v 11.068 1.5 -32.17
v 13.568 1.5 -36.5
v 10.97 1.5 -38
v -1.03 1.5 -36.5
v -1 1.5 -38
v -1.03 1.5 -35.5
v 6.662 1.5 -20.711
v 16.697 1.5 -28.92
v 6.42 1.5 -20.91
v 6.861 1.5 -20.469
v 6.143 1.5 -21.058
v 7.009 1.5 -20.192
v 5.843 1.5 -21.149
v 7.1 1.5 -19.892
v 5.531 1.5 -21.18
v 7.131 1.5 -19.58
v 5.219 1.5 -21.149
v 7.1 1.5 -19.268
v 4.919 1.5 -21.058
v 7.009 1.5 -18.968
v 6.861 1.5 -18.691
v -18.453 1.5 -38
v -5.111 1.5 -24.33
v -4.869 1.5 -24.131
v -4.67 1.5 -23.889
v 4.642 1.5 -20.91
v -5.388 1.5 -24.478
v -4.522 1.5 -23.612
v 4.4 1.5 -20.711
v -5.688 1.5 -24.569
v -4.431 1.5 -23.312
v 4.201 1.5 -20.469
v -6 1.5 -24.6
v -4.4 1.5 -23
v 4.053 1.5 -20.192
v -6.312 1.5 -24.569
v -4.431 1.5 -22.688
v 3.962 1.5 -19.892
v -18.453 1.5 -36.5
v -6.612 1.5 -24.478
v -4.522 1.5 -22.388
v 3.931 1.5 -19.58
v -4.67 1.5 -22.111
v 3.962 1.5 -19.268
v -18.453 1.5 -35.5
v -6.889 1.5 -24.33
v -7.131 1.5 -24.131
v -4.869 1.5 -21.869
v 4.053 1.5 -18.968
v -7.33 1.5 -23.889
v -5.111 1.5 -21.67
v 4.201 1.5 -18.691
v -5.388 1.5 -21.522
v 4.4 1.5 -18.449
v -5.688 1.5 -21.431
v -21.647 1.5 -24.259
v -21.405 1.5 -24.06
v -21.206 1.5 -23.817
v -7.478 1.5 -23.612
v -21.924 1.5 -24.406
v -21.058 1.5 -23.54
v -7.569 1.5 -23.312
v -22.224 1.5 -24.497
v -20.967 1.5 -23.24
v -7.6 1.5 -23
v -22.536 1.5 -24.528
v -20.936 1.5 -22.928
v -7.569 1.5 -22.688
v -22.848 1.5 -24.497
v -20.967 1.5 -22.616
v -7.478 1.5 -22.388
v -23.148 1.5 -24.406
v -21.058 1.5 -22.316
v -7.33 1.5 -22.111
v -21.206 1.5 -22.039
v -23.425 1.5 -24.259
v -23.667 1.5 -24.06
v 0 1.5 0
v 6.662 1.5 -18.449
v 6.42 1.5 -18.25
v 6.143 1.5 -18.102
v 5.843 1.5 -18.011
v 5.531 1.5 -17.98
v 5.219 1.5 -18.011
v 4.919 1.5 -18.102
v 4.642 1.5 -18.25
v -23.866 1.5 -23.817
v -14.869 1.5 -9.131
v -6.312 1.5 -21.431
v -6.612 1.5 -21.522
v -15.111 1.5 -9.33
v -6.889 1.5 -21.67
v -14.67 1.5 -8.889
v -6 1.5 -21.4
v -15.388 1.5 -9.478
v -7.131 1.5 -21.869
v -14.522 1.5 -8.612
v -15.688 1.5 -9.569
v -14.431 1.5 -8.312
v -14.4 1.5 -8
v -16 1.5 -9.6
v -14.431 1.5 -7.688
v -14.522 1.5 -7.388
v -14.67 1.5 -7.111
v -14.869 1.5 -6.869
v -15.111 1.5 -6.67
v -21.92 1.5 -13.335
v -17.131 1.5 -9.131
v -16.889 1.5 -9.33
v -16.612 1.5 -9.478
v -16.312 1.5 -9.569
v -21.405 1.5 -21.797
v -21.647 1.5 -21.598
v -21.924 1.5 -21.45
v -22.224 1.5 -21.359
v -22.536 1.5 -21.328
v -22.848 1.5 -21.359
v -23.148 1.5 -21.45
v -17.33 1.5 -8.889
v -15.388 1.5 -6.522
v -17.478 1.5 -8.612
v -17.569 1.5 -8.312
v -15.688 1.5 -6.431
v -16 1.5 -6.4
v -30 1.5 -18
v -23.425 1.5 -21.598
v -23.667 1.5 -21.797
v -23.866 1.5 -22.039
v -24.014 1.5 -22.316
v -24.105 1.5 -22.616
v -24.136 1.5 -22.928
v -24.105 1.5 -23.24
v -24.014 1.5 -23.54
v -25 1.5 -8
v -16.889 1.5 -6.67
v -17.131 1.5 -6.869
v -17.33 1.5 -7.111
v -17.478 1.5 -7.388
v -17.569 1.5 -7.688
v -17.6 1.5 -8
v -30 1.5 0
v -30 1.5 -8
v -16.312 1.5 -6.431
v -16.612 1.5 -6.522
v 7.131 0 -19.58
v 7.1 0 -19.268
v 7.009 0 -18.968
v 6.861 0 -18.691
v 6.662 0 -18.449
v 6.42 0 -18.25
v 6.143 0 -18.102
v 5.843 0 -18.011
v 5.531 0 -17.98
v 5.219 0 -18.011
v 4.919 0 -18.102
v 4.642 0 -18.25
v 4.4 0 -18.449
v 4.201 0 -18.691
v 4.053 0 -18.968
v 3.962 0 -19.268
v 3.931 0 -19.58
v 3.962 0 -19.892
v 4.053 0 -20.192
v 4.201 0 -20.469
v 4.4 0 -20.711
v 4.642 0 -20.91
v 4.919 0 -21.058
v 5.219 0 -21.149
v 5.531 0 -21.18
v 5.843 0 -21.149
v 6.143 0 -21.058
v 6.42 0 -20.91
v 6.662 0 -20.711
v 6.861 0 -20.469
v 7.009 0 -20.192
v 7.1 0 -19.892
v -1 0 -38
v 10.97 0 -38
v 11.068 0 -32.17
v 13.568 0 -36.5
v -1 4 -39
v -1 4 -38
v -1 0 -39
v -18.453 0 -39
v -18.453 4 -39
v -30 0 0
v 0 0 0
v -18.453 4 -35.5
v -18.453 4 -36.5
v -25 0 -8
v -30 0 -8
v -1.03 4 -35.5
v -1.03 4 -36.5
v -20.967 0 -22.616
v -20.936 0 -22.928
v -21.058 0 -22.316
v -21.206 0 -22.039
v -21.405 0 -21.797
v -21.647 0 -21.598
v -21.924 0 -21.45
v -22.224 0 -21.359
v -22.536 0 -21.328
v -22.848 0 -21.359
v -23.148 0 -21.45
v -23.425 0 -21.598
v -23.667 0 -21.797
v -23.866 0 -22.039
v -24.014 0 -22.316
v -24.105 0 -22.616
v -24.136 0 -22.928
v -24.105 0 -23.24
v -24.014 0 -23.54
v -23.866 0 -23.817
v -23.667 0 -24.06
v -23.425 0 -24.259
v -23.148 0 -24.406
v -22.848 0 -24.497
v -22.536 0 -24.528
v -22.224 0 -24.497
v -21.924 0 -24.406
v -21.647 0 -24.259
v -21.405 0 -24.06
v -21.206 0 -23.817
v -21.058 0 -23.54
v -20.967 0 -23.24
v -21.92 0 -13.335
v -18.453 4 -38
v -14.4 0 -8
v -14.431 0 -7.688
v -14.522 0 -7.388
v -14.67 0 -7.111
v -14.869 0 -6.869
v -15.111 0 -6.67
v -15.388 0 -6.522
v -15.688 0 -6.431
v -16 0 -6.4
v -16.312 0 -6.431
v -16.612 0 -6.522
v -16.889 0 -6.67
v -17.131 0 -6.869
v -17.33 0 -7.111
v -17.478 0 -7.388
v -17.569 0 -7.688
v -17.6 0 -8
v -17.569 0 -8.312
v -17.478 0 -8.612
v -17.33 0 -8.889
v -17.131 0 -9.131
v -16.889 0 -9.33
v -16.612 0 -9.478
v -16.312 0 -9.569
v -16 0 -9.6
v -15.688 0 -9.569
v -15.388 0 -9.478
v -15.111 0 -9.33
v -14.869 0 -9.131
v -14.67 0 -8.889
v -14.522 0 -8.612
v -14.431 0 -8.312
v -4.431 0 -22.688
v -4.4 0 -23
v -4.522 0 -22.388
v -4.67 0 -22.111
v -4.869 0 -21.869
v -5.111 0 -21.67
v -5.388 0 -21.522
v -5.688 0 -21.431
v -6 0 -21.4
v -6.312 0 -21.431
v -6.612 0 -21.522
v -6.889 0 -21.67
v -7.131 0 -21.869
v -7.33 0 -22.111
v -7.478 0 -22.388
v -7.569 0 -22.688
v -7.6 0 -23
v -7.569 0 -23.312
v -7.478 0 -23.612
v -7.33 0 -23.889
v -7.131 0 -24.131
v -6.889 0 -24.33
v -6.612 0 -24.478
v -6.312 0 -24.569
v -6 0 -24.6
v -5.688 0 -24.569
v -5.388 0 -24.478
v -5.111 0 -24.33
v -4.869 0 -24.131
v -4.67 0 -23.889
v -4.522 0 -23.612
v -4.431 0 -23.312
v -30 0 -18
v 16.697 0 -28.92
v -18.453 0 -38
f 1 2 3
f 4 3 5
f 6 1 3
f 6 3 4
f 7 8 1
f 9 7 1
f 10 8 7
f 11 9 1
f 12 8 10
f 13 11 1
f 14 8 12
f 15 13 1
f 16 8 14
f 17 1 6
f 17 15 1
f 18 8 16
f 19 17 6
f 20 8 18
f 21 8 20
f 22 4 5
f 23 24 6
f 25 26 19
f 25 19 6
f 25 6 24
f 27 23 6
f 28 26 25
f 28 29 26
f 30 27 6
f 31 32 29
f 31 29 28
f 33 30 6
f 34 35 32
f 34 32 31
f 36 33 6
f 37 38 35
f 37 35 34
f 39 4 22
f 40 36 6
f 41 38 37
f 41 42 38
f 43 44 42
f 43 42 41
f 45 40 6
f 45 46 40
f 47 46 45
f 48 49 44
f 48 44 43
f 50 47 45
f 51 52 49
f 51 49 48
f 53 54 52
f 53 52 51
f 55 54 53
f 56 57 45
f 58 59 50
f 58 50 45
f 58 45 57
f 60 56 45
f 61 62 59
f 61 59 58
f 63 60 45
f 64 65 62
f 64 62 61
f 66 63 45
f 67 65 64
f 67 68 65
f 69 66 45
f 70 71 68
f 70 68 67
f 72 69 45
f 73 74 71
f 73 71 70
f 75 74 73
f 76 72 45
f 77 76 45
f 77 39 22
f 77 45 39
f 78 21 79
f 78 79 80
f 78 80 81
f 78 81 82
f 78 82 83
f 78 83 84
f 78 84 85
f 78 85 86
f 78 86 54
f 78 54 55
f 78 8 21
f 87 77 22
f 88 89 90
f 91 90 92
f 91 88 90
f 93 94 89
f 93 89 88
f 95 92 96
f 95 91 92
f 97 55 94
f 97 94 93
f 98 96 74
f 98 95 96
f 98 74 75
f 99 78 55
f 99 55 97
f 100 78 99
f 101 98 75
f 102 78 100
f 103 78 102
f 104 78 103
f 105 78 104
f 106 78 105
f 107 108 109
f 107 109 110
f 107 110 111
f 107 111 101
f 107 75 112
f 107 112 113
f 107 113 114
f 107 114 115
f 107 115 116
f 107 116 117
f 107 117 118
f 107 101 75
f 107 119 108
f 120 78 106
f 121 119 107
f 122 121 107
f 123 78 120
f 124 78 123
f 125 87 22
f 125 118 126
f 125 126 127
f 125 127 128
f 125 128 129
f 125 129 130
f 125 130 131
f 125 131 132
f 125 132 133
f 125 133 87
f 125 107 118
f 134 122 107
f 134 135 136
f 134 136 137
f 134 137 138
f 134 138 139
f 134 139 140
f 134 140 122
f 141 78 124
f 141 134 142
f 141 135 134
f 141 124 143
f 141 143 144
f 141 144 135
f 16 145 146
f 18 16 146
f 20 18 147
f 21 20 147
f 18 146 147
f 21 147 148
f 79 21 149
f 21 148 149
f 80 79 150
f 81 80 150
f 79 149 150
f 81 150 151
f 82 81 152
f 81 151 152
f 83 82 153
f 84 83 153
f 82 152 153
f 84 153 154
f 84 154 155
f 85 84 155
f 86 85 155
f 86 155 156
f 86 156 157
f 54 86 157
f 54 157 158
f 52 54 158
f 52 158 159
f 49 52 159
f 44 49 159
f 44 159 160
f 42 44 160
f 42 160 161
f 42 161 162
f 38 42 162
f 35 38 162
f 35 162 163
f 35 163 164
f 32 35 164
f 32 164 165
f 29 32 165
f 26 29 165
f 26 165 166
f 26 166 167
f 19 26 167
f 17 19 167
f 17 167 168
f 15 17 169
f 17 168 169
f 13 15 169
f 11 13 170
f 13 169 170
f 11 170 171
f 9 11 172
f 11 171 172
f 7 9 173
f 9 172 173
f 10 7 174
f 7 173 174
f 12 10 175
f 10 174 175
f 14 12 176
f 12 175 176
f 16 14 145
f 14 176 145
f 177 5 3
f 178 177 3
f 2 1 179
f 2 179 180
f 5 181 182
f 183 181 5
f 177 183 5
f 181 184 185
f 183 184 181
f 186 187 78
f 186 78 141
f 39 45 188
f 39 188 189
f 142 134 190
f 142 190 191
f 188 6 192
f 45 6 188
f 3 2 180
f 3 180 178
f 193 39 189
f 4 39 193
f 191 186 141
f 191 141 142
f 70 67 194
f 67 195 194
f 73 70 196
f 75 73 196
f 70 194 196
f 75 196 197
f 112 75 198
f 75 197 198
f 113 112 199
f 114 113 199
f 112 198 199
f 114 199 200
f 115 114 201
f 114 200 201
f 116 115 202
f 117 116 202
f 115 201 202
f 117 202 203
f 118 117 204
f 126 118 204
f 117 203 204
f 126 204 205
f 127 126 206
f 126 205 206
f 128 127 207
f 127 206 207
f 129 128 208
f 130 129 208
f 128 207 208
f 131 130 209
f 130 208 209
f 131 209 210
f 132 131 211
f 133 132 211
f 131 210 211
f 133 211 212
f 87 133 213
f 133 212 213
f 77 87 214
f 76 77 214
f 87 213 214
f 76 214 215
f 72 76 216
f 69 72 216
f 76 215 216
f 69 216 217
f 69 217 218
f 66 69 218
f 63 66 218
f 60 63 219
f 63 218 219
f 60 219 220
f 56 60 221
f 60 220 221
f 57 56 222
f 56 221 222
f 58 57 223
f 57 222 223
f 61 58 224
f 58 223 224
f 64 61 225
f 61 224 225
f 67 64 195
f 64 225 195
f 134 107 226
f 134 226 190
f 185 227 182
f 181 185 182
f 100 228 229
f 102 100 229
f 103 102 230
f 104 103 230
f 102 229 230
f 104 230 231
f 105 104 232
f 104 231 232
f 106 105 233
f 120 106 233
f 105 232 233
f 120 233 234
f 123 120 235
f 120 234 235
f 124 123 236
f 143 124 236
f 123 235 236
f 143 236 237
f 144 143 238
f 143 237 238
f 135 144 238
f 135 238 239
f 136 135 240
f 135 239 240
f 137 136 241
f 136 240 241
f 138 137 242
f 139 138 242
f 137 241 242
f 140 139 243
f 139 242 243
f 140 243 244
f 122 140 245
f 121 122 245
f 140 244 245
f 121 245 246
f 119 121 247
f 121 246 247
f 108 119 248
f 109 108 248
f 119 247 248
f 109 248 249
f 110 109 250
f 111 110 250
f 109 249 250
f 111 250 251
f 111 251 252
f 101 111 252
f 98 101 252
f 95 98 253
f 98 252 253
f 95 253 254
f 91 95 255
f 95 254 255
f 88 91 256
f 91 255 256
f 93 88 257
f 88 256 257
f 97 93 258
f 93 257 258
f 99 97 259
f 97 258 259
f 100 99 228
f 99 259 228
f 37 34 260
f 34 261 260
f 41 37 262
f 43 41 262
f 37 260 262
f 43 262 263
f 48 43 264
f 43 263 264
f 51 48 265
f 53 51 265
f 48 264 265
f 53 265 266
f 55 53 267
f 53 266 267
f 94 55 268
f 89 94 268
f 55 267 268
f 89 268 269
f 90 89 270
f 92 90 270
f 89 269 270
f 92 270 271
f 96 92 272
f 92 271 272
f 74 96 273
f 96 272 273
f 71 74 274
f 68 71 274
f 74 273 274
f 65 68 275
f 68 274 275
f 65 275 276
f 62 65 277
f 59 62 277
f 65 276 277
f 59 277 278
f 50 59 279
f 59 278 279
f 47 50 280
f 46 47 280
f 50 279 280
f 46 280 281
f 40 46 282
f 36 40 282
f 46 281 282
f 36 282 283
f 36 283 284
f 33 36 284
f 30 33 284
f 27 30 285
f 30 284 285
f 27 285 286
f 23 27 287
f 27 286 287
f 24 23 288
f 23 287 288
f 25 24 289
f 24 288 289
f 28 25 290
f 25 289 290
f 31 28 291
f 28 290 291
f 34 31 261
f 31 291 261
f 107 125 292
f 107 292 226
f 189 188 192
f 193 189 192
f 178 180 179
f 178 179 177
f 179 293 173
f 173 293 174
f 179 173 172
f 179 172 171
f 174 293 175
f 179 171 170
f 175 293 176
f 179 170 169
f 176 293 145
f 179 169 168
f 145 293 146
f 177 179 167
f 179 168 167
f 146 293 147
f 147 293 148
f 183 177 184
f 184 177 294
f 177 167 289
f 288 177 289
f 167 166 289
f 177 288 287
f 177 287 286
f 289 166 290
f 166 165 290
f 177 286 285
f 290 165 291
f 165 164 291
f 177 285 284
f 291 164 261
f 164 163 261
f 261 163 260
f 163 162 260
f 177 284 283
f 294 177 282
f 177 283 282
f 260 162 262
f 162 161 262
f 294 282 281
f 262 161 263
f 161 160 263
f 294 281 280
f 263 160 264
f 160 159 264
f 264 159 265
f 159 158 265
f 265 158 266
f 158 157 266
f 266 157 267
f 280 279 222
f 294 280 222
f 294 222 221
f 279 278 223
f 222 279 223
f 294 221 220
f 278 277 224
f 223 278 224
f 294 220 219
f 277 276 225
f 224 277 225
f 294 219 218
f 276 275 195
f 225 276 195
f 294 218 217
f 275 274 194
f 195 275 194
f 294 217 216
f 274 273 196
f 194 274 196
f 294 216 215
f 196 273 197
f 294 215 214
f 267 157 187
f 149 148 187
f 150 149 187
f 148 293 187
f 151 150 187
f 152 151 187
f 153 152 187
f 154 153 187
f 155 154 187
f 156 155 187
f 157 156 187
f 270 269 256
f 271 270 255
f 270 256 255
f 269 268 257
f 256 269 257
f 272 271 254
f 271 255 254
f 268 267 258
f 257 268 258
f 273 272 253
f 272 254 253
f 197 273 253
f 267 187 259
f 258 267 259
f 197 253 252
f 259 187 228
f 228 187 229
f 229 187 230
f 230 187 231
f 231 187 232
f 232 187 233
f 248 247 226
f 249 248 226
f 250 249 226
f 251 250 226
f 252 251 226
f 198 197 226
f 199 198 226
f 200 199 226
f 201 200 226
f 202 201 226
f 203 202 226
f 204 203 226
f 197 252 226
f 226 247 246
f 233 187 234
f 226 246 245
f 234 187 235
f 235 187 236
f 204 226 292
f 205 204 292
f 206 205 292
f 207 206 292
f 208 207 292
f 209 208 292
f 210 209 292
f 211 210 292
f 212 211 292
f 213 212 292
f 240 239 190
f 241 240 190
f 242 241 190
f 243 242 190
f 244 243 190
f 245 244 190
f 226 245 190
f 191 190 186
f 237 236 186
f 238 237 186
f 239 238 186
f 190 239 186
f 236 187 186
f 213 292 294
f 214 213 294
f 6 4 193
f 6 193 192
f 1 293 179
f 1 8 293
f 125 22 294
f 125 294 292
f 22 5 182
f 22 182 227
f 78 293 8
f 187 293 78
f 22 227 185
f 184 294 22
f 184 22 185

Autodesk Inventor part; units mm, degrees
ref_plane "YZ Plane" through (0, 0, 0) normal (1, 0, 0) x (0, 1, 0)
ref_plane "XZ Plane" through (0, 0, 0) normal (0, 1, 0) x (-1, 0, 0)
ref_plane "XY Plane" through (0, 0, 0) normal (0, 0, 1) x (1, 0, 0)
sketch "スケッチ1" plane through (0, 0, 0) normal (0, 1, 0) x (-1, 0, 0)
  line L0 (0, 0) -> (30, 0)
  line L1 (30, 0) -> (30, -135.2775)
  line L2 (30, -135.2775) -> (-78.1025, -135.2775)
  line L3 (-78.1025, -135.2775) -> (0, 0)
  dimension "d0" = 30
  dimension "d1" = 60
extrude "押し出し1" add sketch "スケッチ1" along normal blind 1.5
sketch "スケッチ2" plane through (0, 1.5, 0) normal (0, 1, 0) x (1, 0, 0)
  line L0 (-25, 8) -> (-25, 1.5) projected
  line L1 (-21.9199, 13.3349) -> (-25, 8) projected
  line L2 (-30, 18) -> (-21.9199, 13.3349) projected
  line L3 (-24.2265, 28) -> (-30, 18) projected
  line L4 (0, 28) -> (-24.2265, 28) projected
  line L5 (0, 36.5) -> (0, 28) projected
  line L6 (5, 36.5) -> (0, 36.5) projected
  line L7 (5, 38) -> (5, 36.5) projected
  line L8 (10.9697, 38) -> (5, 38) projected
  line L9 (13.5677, 36.5) -> (10.9697, 38) projected
  line L10 (11.0677, 32.1699) -> (13.5677, 36.5) projected
  line L11 (16.6969, 28.9199) -> (11.0677, 32.1699) projected
  line L12 (7.3612, 12.75) -> (16.6969, 28.9199) projected
  line L13 (0, 17) -> (7.3612, 12.75) projected
  line L14 (-12, 17) -> (0, 17) projected
  line L15 (-12, 8) -> (-12, 17) projected
  line L16 (-5, 8) -> (-12, 8) projected
  line L17 (-5, 1.5) -> (-5, 8) projected
  line L18 (-25, 1.5) -> (-5, 1.5) projected
  line L19 (78.1025, 135.2775) -> (-30, 135.2775) projected
  line L20 (-30, 135.2775) -> (-30, 0) projected
  line L21 (-30, 0) -> (0, 0) projected
  line L22 (0, 0) -> (78.1025, 135.2775) projected
  line L23 (-24.2265, 28) -> (-18.453, 38)
  line L24 (-18.453, 38) -> (5, 38)
  line L25 (13.5677, 36.5) -> (19.1969, 33.25)
extrude "押し出し2" cut sketch "スケッチ2" against normal through all contours L20 L19 L22 L25 L9 L8 L24 L23 L3
sketch "スケッチ3" plane through (0, 1.5, 0) normal (0, 1, 0) x (1, 0, 0)
  line L0 (-30, 18) -> (-21.9199, 13.3349) projected
  line L1 (-21.9199, 13.3349) -> (-25, 8) projected
  line L2 (-25, 8) -> (-30, 8)
  line L3 (-30, 18) -> (-30, 0) projected
  line L4 (11.0677, 32.1699) -> (13.5677, 36.5) projected
  line L5 (16.6969, 28.9199) -> (11.0677, 32.1699) projected
  line L6 (19.1969, 33.25) -> (10.9697, 38) projected
  line L7 (0, 0) -> (19.1969, 33.25) projected
extrude "押し出し3" cut sketch "スケッチ3" against normal through all
sketch "スケッチ4" plane through (0, 0, 0) normal (0, -1, 0) x (1, 0, 0)
  line L0 (-18.453, -39) -> (3.9697, -39) projected
  line L1 (-18.453, -38) -> (-18.453, -39) projected
  line L2 (-18.453, -39) -> (3.9697, -39) projected
  line L3 (3.9697, -38) -> (-18.453, -38) projected
  line L4 (-1, -38) -> (-1, -36.5) projected
  line L5 (-1, -39) -> (-1, -35.5)
  line L6 (3.9697, -39) -> (3.9697, -38) projected
  line L7 (3.9697, -39) -> (3.9697, -38) projected
  line L8 (3.9697, -38) -> (-18.453, -38) projected
  line L9 (-18.453, -38) -> (-18.453, -39) projected
  line L10 (-18.453, -39) -> (3.9697, -39) projected
  line L11 (-1.0303, -36.5) -> (-1.0303, -35.5) projected
  line L12 (-1.0303, -35.5) -> (-18.453, -35.5) projected
  line L13 (-18.453, -35.5) -> (-18.453, -36.5) projected
  line L14 (-18.453, -36.5) -> (-1.0303, -36.5) projected
  point P0 (0, 0)
extrude "押し出し4" add sketch "スケッチ4" against normal blind 4 contours L1 L3 L5 L0 | L14 L13 L12 L11
sketch "スケッチ5" plane through (0, 0, 0) normal (0, -1, 0) x (1, 0, 0)
  circle A0 centre (-6, -23) radius 1.35 projected
  circle A1 centre (5.5311, -19.5801) radius 1.35 projected
  circle A2 centre (-16, -8) radius 1.35 projected
  circle A3 centre (-22.5359, -22.9282) radius 1.35 projected
  circle A4 centre (-22.5359, -22.9282) radius 1.6
  circle A5 centre (-16, -8) radius 1.6
  circle A6 centre (-6, -23) radius 1.6
  circle A7 centre (5.5311, -19.5801) radius 1.6
  point P0 (0, 0)
  dimension "d13" = 3.2
extrude "押し出し5" cut sketch "スケッチ5" against normal through all contours A0 | A1 | A2 | A3 | A4 | A5 | A6 | A7
equation "\"BendRadius\" = Thickness"
equation "\"BendReliefWidth\" = Thickness"
equation "\"BendReliefDepth\" = 0.5 * Thickness"
equation "\"CornerReliefSize\" = 4 * Thickness"
equation "\"MinimumRemnant\" = 2 * Thickness"
equation "\"TransitionRadius\" = BendRadius"
equation "\"JacobiRadiusSize\" = BendRadius"
equation "\"GapSize\" = Thickness"
equation "\"d6\" = Thickness"
equation "\"Thickness\" = 1.5"
properties part number "rail_cover_under"
